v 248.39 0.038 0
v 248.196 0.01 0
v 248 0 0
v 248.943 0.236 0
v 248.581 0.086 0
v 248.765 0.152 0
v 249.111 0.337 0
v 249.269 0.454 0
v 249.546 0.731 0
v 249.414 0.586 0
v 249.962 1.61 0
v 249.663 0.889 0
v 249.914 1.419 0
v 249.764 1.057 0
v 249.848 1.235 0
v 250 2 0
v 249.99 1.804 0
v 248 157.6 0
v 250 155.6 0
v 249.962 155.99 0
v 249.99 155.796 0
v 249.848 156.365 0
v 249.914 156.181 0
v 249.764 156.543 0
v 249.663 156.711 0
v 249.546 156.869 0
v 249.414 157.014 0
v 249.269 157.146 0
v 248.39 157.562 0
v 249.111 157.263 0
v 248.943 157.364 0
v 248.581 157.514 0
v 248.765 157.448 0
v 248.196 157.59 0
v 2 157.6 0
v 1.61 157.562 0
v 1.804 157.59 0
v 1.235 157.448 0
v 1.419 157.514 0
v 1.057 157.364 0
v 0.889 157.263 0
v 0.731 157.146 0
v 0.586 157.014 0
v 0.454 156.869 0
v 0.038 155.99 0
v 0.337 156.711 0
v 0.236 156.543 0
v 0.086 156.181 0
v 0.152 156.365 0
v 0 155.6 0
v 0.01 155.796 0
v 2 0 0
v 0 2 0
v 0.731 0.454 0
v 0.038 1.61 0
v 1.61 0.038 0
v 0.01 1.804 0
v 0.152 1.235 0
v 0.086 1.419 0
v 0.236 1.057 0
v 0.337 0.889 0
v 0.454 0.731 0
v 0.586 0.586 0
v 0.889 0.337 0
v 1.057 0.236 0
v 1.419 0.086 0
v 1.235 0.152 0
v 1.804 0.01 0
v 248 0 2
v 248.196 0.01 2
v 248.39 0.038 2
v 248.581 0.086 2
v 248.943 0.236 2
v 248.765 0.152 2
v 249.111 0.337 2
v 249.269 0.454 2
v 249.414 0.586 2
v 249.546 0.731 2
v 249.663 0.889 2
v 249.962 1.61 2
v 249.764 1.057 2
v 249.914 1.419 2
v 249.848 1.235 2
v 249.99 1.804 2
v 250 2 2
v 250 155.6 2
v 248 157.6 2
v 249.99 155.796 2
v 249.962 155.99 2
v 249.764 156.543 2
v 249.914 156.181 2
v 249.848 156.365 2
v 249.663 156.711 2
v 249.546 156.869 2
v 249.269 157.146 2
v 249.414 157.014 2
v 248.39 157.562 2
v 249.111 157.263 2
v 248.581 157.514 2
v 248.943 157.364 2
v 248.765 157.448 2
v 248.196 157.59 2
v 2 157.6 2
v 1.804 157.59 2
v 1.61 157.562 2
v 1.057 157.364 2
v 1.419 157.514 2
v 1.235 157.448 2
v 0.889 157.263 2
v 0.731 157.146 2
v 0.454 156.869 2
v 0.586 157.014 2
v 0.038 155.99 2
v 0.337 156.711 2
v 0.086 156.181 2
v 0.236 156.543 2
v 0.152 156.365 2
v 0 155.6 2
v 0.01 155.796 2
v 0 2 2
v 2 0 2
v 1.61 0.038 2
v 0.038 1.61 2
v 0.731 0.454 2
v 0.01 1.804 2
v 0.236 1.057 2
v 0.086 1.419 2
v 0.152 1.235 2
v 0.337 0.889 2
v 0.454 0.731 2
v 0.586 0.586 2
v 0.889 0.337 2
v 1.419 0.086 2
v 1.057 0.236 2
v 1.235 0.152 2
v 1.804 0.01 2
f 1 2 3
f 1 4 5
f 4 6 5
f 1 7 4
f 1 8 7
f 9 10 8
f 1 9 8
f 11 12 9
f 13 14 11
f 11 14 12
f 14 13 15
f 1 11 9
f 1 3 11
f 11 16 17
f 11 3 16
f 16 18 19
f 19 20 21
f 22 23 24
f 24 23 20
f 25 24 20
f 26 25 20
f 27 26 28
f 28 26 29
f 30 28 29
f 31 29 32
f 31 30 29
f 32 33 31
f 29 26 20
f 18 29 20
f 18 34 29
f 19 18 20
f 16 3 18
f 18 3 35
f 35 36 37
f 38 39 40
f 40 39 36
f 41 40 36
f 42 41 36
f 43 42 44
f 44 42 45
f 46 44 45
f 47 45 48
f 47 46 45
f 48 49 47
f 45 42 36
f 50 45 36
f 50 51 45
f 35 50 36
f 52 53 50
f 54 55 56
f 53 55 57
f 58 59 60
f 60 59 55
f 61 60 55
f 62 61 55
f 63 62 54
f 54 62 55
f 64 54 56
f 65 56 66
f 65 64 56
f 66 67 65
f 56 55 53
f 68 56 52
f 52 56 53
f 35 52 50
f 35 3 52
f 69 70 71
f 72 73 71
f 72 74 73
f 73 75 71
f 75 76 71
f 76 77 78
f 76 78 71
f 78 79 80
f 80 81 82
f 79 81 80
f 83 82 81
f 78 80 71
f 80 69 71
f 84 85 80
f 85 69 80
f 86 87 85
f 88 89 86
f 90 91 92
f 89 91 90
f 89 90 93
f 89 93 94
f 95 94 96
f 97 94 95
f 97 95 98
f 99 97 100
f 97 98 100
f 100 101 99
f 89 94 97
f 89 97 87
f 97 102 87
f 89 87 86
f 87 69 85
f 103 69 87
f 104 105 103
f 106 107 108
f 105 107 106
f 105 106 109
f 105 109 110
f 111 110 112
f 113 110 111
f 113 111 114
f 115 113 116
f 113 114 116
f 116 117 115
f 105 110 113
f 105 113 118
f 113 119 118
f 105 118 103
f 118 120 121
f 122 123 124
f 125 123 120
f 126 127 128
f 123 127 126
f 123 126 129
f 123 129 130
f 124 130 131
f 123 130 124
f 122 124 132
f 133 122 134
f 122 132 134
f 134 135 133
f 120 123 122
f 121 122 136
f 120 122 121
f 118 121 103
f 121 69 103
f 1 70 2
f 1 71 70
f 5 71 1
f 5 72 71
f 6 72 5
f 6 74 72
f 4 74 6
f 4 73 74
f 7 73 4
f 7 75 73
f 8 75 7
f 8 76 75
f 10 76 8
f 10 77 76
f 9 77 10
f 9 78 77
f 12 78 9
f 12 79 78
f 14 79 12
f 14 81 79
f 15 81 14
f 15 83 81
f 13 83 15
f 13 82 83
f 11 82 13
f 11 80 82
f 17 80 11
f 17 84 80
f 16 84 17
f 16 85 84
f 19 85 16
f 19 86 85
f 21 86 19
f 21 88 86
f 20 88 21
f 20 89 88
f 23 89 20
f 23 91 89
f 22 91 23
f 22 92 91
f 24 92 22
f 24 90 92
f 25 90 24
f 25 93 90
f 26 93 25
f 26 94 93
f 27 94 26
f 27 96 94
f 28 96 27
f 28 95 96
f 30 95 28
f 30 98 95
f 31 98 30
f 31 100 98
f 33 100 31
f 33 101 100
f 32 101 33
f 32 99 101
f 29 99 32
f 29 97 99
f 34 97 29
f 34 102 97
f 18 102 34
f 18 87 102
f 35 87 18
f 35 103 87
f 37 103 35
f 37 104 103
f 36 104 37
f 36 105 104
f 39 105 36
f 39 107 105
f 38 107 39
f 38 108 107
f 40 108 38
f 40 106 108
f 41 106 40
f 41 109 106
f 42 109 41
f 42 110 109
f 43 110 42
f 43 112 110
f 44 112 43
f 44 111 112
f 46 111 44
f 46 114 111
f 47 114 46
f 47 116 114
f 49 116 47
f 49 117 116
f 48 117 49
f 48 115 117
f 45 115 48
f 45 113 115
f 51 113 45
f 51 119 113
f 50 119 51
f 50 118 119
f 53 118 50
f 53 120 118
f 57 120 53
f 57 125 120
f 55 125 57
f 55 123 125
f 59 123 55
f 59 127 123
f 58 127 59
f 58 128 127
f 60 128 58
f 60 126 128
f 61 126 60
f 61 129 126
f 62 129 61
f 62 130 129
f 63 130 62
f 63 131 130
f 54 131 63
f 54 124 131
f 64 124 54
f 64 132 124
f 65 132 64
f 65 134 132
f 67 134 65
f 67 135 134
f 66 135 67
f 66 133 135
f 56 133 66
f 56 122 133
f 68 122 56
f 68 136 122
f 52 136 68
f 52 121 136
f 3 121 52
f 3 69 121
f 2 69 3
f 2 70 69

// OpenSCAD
// file: lib/params.scad
// Shared parameters for the dowel desk shelf.
// Internally everything is mm (OpenSCAD's native unit); inch inputs are
// converted right where they're defined.

function in_to_mm(v) = v * 25.4;

// --- Dowel ---
// Standard inch dowel stock: 1/4, 3/8, 1/2, 5/8, 3/4, 1"
dowel_diameter_in = 3/4;
dowel_diameter    = in_to_mm(dowel_diameter_in);
dowel_tolerance   = 0.3;  // added to bore diameter for a snug press/slide fit
dowel_bore_depth  = 25;   // how far the dowel is captured inside the wall piece
dowel_length_in   = 36;   // length of the dowel rod stock, wall-mount face to wall-mount face
dowel_length      = in_to_mm(dowel_length_in);

// --- Dowel row (top edge of the wall bracket) ---
num_dowels        = 6;
dowel_min_wall    = 6;    // min plastic left between adjacent dowel bores
dowel_edge_margin = 10;   // plastic left outboard of the first/last dowel
dowel_row_offset  = 15;   // distance from the top edge down to the hole row
dowel_fillet_r    = 2;    // rounds the edge where each bore opens on the front face

dowel_bore_d   = dowel_diameter + dowel_tolerance;
dowel_spacing  = dowel_bore_d + dowel_min_wall; // center-to-center

// --- Wall bracket block ---
// "width" runs along the wall (left-right), "height" is vertical,
// "depth" is how far the block sticks out from the wall (front-back).
// Width is derived so all dowels fit with the margins/spacing above.
wall_bracket_width  = (num_dowels - 1) * dowel_spacing + dowel_bore_d + 2 * dowel_edge_margin;
wall_bracket_height = 140;
wall_bracket_depth  = dowel_bore_depth + 10; // bore depth + material behind it
corner_radius       = 4; // fillet radius on all 12 edges of the block

// --- Shelf panel slot ---
// A second, flat PLA shelf panel spans between the left and right wall
// brackets the same way the dowels do. Each bracket has a slot open on
// the same face as the dowel bores (X = wall_bracket_depth), running
// along Y nearly the full width, blind at shelf_slot_depth back from
// that face.
shelf_thickness  = 2;    // panel thickness the slot is sized around
shelf_clearance  = 0.3;  // added to slot height for a slide fit
shelf_slot_depth  = 15;  // along X, how far the panel is captured from the front face
shelf_slot_margin = 8;   // along Y, inset from the bracket's left/right edges
shelf_slot_z      = 30;  // height of the slot's vertical center, from the bottom

shelf_slot_h = shelf_thickness + shelf_clearance;
shelf_slot_w = wall_bracket_width -  shelf_slot_margin; // slot's extent along Y

// --- Shelf panel ---
// The panel that actually slides into the slot above.
shelf_width_clearance = 0.5; // subtracted from the slot width for an easy slide fit
shelf_corner_radius  = 2;    // rounds the panel's corners (kept well under half of shelf_thickness's plan dimensions)
// shelf_length = dowel_length - 2 * dowel_bore_depth + 2 * shelf_slot_depth; // total panel length, including the ends captured in each bracket's slot
shelf_length = 250;
shelf_width  = shelf_slot_w - shelf_width_clearance;

// --- Flat-top tray ---
// A printed surface that rests on the dowels: flat on top, with a
// half-round channel on the underside for each dowel so it cradles them.
// The channels line up with the bracket's dowel row (same Y positions).
tray_length        = 250; // along the dowels (X); sized for a 256x256 print bed
tray_top_thickness = 4;   // material above the top of the dowels
tray_wrap_depth    = 6;   // how far the clips on the two OUTER dowels extend below the
                          // dowel centerline (keep < dowel radius, ~9.7mm, or the channel
                          // becomes a closed tunnel; ~6 gives a snap-fit)
tray_clip_wall     = 3;   // plastic around each outer dowel's clip
tray_corner_radius = 2;   // rounds the tray's edges

tray_width  = wall_bracket_width; // spans the same dowel row as the brackets
tray_height = dowel_bore_d / 2 + tray_top_thickness; // flat slab; clips hang below it

// --- Half shelf (laptop support) ---
// A shorter, reinforced version of the shelf panel: slides into one
// bracket's shelf_slot groove (same slot, same fit as shelf_panel.scad)
// and cantilevers out toward the middle instead of spanning wall-to-wall.
// Use one against each of two brackets bounding a gap, so together they
// carry a laptop resting across both with a small gap between them.
// It sits below the dowel row and does not touch or rely on the dowels
// at all -- only the slot anchors it.
//
// A flat panel at shelf_thickness would sag/snap cantilevered this far,
// so the part captured in the slot tapers up to half_shelf_root_height
// and steps back down to shelf_thickness over half_shelf_taper_length,
// trading some slot clearance for a much stiffer root where the bending
// load is highest. If that's still not stiff enough, half_shelf_leg_drop
// adds a short leg near the far end that lets it rest on the desk below
// rather than stay fully cantilevered -- fine but not preferred.
half_shelf_length        = 120;  // total length from the slot's front-face
                                  // opening to the far (unsupported) end;
                                  // tune so two of these leave a small gap
                                  // at the midpoint of your actual span
half_shelf_root_height   = 12;   // thickness at the root (inside the slot
                                  // opening), tapering down to shelf_thickness
half_shelf_taper_length  = 40;   // how far along half_shelf_length the taper
                                  // from root_height down to shelf_thickness runs
half_shelf_leg_drop      = 0;    // extra material dropped from the underside
                                  // near the far end down to desk height, as a
                                  // last-resort support (0 disables it; set to
                                  // the measured gap from shelf underside to
                                  // desk surface to enable)
half_shelf_leg_length    = 20;   // how much of the far end the leg spans

// --- Rubber feet ---
// Shallow recesses in the bottom face (Z=0) so self-adhesive rubber feet
// sit flush, one near each of the four bottom corners.
// foot_diameter_in  = 0.25;
//foot_diameter     = in_to_mm(foot_diameter_in);
foot_diameter = 12;
foot_recess_depth = 1.5;  // just enough to seat the foot, not a structural pocket
foot_inset        = 10;   // distance from bottom-face edges to foot centers

// --- Print-friendliness ---
$fn = 64; // circle smoothness for previews/renders
// file: lib/bracket.scad
// Shared geometry for the wall-end bracket. Included by wall.scad and
// wall_mirrored.scad so both halves of the shelf stay in sync.

include <params.scad>

// Box with all 12 edges filleted to radius r, spanning [0,0,0] to size.
module rounded_box(size, r) {
    hull() {
        for (x = [r, size[0] - r])
            for (y = [r, size[1] - r])
                for (z = [r, size[2] - r])
                    translate([x, y, z]) sphere(r = r);
    }
}

// Thin slab spanning [0,0,0] to size, with all 4 vertical (Z-axis)
// edges rounded to radius r; top and bottom stay flat. Used for panels
// too thin for rounded_box's spherical corner fillets to make sense.
module rounded_slab(size, r) {
    linear_extrude(height = size[2])
        offset(r = r)
            offset(delta = -r)
                square([size[0], size[1]]);
}

// Slab spanning [0,0,0] to [length, width, thickness] with only the two
// far-end (X = length) corners rounded to radius r; the near end (X=0)
// stays square. Used where the near end is captured in a slot and the
// far end is the exposed, handled edge.
module rounded_tip_slab(length, width, thickness, r) {
    linear_extrude(height = thickness)
        hull() {
            square([length - r, width]);
            translate([length - r, r]) circle(r = r);
            translate([length - r, width - r]) circle(r = r);
        }
}

// A blind bore of diameter d and depth `depth`, aligned along +Z from
// z=0 (blind end) to z=depth (opening), with a concave fillet of radius
// `fillet_r` rounding the edge where the bore meets the opening face.
// Extends 1mm past z=depth so the opening cuts cleanly through a face.
module rounded_bore(d, depth, fillet_r) {
    r = d / 2;
    steps = 8;
    arc = [for (i = [0 : steps])
        let (theta = 180 - i * (90 / steps))
        [r + fillet_r + fillet_r * cos(theta), (depth - fillet_r) + fillet_r * sin(theta)]
    ];
    profile = concat(
        [[0, 0], [r, 0]],
        arc,
        [[r + fillet_r, depth + 1], [0, depth + 1]]
    );
    rotate_extrude(angle = 360)
        polygon(points = profile);
}

// A bore of diameter d and length `length` that runs the full length,
// open at both ends with a matching concave fillet of radius `fillet_r`
// rounding both openings. Used for a middle bracket the dowels pass
// through, as opposed to the wall-end brackets where they stop blind.
module through_bore(d, length, fillet_r) {
    r = d / 2;
    steps = 8;
    bottom_arc = [for (i = [0 : steps])
        let (theta = 270 - i * (90 / steps))
        [r + fillet_r + fillet_r * cos(theta), fillet_r + fillet_r * sin(theta)]
    ];
    top_arc = [for (i = [0 : steps])
        let (theta = 180 - i * (90 / steps))
        [r + fillet_r + fillet_r * cos(theta), (length - fillet_r) + fillet_r * sin(theta)]
    ];
    profile = concat(
        [[0, -1], [r + fillet_r, -1]],
        bottom_arc,
        top_arc,
        [[r + fillet_r, length + 1], [0, length + 1]]
    );
    rotate_extrude(angle = 360)
        polygon(points = profile);
}

// through_dowels=false (default): wall-end bracket, dowels stop blind
// inside it. through_dowels=true: middle bracket, dowels pass all the
// way through so the shelf doesn't have to span the full wall-to-wall
// distance in one piece.
module wall_bracket(through_dowels = false) {
    difference() {
        // Main block, flush against the wall on its back (X=0) face,
        // with rounded corners/edges everywhere.
        rounded_box([wall_bracket_depth, wall_bracket_width, wall_bracket_height], corner_radius);

        // Dowel row: bored in from the front face, running along the
        // depth (X) axis, evenly spaced along the top edge. Blind unless
        // through_dowels is set, in which case they pass all the way
        // through to the back face.
        for (i = [0 : num_dowels - 1]) {
            y = dowel_edge_margin + dowel_bore_d / 2 + i * dowel_spacing;
            z = wall_bracket_height - dowel_row_offset;
            if (through_dowels) {
                translate([0, y, z])
                    rotate([0, 90, 0])
                        through_bore(dowel_bore_d, wall_bracket_depth, dowel_fillet_r);
            } else {
                translate([wall_bracket_depth - dowel_bore_depth, y, z])
                    rotate([0, 90, 0])
                        rounded_bore(dowel_bore_d, dowel_bore_depth, dowel_fillet_r);
            }
        }

        // Shelf panel slot: open on the same front face as the dowel
        // bores (X = wall_bracket_depth), running along Y nearly the
        // full width, blind at shelf_slot_depth back from that face.
        translate([wall_bracket_depth - shelf_slot_depth,
                   shelf_slot_margin,
                   shelf_slot_z - shelf_slot_h / 2])
            cube([shelf_slot_depth + 1, shelf_slot_w, shelf_slot_h]);

        // Rubber foot recesses: shallow pockets in the bottom face,
        // one near each of the four bottom corners.
        for (x = [foot_inset, wall_bracket_depth - foot_inset])
            for (y = [foot_inset, wall_bracket_width - foot_inset])
                translate([x, y, -0.1])
                    cylinder(h = foot_recess_depth + 0.1, d = foot_diameter);
    }
}
// main file
// Slide-in shelf panel: a flat PLA panel that spans between the left and
// right wall brackets, captured by the shelf slot cut into each bracket
// (see wall.scad). Its length is derived from dowel_length_in so it
// spans the same wall-to-wall gap as the dowels.
//
// Render:
//   openscad -o export/shelf.stl scad/shelf.scad

include <lib/bracket.scad>

module shelf_panel() {
    rounded_slab([shelf_length, shelf_width, shelf_thickness], shelf_corner_radius);
}

shelf_panel();
